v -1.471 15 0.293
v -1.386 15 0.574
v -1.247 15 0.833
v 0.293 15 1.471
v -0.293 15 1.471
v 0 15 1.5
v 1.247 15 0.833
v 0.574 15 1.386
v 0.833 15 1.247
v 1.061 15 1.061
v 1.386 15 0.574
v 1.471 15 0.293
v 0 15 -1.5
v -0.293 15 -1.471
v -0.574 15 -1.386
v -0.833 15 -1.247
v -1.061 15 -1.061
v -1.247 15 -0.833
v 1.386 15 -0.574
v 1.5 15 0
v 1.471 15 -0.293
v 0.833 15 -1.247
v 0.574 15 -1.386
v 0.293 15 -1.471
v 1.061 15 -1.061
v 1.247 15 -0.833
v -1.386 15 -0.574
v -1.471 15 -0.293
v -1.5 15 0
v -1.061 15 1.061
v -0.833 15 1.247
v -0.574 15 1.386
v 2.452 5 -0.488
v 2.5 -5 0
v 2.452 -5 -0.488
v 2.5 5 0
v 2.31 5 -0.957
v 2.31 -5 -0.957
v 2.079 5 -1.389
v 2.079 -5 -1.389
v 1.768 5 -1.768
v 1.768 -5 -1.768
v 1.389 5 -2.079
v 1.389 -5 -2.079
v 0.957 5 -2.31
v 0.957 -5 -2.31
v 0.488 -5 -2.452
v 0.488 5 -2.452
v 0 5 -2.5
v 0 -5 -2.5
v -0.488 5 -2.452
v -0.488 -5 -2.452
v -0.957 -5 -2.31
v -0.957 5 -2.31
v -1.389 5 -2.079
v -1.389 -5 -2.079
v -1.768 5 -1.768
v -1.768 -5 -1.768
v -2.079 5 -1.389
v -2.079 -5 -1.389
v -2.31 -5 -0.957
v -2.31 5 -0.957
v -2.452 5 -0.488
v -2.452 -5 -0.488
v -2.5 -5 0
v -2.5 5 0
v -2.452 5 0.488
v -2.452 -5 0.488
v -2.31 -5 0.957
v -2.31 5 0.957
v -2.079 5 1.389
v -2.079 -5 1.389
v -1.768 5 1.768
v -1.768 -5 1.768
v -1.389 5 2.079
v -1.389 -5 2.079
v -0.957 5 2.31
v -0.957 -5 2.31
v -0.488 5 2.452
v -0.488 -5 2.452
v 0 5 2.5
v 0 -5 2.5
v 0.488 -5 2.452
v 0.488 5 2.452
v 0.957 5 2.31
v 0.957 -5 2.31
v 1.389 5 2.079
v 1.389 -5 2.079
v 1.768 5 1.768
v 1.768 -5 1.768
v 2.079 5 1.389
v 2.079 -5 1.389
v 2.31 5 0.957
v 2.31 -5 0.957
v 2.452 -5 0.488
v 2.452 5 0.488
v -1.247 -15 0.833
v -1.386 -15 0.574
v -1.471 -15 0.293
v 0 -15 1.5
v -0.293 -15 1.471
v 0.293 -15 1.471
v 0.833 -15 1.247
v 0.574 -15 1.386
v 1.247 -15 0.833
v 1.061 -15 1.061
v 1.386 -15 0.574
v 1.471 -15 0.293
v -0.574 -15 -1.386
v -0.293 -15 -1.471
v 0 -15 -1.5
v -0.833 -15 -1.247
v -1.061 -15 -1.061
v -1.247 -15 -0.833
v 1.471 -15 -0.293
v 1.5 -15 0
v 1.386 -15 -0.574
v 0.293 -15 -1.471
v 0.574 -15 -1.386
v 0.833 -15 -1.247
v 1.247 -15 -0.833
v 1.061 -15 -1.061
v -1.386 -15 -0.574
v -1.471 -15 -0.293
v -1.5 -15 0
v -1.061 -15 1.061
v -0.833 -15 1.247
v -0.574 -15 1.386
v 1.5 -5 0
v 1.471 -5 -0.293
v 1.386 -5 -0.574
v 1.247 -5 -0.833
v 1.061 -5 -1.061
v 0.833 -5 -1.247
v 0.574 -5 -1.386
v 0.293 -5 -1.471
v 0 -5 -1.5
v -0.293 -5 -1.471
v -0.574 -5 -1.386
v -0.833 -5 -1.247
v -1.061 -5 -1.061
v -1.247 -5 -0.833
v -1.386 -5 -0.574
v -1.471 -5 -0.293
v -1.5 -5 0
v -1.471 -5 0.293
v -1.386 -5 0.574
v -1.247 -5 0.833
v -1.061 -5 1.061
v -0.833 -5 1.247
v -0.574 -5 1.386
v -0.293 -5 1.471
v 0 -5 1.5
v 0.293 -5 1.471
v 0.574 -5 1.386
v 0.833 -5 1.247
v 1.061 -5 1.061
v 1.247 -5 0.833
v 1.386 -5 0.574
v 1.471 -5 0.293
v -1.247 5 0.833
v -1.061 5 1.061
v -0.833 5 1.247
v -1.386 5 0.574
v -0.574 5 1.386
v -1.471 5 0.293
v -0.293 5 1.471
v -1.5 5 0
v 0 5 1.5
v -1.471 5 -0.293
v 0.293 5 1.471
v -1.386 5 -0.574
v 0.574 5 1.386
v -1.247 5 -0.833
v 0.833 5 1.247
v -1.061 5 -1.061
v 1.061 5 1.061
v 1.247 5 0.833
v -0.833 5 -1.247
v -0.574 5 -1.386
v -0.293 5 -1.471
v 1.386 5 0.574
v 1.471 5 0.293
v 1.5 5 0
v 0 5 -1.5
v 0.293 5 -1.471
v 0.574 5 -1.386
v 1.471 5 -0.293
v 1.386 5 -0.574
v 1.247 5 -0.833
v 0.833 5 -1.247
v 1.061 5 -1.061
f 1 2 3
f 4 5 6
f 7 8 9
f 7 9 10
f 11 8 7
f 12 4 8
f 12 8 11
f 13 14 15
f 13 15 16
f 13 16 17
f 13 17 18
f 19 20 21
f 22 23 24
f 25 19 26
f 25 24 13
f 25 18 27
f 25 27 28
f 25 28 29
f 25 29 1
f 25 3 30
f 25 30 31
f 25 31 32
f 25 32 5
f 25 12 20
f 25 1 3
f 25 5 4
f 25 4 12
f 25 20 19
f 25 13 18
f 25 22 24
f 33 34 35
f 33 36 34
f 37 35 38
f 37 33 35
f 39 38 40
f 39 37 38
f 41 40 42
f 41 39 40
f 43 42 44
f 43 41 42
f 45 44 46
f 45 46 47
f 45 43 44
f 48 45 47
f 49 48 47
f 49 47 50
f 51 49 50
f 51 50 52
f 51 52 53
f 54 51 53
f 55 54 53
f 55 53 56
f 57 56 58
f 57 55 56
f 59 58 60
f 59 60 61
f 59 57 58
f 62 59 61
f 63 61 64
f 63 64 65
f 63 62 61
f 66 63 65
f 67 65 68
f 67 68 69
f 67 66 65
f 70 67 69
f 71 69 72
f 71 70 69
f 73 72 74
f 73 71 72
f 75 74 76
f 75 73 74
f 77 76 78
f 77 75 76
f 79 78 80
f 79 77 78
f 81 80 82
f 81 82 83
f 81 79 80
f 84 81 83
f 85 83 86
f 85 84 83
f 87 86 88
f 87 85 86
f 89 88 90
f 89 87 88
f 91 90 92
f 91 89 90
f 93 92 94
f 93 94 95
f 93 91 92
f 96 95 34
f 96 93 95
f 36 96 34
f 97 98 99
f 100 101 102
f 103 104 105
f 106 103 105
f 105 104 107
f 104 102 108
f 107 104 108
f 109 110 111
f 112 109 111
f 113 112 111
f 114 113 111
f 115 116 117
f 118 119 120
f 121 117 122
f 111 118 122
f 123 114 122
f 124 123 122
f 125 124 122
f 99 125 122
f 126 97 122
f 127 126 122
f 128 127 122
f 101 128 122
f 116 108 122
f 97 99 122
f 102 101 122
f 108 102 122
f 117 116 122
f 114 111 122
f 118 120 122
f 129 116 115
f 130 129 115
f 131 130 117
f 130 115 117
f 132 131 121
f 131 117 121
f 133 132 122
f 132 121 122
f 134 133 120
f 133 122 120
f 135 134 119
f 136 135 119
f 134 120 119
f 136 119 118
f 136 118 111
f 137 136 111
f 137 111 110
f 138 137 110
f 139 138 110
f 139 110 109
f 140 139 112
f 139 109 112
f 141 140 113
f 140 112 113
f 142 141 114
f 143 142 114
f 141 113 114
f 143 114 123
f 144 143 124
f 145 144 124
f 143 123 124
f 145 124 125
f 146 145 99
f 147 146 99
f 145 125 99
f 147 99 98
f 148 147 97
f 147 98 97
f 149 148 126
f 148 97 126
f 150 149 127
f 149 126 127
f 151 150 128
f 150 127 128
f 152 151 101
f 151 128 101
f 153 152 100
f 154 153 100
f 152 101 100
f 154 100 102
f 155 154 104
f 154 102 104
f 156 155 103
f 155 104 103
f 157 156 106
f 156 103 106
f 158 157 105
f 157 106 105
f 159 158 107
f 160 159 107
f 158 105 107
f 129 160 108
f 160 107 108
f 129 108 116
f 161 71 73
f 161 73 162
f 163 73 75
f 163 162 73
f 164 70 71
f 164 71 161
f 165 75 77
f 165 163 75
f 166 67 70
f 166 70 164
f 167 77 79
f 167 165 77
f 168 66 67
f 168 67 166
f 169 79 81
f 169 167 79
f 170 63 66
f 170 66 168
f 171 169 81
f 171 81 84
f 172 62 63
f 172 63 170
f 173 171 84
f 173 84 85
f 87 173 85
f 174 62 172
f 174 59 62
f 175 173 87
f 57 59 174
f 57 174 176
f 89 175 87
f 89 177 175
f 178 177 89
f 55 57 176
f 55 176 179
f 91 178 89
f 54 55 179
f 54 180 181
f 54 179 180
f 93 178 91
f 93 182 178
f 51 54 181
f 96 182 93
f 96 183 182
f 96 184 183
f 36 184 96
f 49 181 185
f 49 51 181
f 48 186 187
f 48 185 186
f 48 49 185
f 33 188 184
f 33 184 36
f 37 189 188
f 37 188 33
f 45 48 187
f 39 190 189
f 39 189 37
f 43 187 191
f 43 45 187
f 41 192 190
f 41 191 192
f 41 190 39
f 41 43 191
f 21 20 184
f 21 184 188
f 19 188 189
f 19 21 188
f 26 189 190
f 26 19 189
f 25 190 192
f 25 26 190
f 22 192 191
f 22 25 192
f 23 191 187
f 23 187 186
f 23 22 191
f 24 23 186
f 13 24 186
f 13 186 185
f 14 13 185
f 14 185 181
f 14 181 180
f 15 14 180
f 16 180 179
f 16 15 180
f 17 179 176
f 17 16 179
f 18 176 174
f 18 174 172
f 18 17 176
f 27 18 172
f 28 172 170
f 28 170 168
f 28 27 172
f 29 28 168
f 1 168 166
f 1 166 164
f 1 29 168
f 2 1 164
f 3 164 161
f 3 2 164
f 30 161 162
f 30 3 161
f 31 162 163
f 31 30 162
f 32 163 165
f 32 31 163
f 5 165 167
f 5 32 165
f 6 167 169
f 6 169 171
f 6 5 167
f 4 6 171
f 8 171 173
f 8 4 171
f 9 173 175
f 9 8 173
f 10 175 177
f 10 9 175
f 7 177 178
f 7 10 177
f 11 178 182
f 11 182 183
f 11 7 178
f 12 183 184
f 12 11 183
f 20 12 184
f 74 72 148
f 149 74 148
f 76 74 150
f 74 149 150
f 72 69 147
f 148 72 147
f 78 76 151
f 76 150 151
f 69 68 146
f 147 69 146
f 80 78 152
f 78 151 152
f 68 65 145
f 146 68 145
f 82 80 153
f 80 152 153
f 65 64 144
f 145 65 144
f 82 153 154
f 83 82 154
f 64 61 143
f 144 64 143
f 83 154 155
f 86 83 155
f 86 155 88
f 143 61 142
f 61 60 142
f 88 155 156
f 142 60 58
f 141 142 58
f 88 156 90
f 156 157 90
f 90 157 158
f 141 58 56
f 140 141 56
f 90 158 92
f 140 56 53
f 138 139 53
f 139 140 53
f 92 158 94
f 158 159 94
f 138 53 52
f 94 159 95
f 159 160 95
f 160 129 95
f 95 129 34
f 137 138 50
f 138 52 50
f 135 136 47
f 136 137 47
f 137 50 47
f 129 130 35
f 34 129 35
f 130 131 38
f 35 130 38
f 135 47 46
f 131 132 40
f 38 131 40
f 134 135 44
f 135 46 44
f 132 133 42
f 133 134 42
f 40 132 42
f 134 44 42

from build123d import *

# Parameters (mm, degrees)
SKETCH1_R           = 2.5
BOSS_EXTRUDE1_DEPTH = 15
SKETCH2_R           = 12.5
SKETCH2_R_2         = 1.5
CUT_EXTRUDE1_DEPTH  = 10


with BuildPart() as part:
    # Sketch1 → Boss-Extrude1 (new body, symmetric)
    with BuildSketch(Plane(origin=(0, 0, 0), x_dir=(1, 0, 0), z_dir=(0, 1, 0))):
        Circle(SKETCH1_R)
    extrude(amount=BOSS_EXTRUDE1_DEPTH, both=True)

    # Sketch2 → Cut-Extrude1 (cut)
    with BuildSketch(Plane(origin=(0, 15, 0), x_dir=(1, 0, 0), z_dir=(0, 1, 0))):
        Circle(SKETCH2_R)
        Circle(SKETCH2_R_2, mode=Mode.SUBTRACT)
    cut_extrude1 = extrude(amount=-CUT_EXTRUDE1_DEPTH, mode=Mode.SUBTRACT)

    # Mirror1: Cut-Extrude1 across plane
    add(cut_extrude1.mirror(Plane.ZX), mode=Mode.SUBTRACT)


solid = part.part
